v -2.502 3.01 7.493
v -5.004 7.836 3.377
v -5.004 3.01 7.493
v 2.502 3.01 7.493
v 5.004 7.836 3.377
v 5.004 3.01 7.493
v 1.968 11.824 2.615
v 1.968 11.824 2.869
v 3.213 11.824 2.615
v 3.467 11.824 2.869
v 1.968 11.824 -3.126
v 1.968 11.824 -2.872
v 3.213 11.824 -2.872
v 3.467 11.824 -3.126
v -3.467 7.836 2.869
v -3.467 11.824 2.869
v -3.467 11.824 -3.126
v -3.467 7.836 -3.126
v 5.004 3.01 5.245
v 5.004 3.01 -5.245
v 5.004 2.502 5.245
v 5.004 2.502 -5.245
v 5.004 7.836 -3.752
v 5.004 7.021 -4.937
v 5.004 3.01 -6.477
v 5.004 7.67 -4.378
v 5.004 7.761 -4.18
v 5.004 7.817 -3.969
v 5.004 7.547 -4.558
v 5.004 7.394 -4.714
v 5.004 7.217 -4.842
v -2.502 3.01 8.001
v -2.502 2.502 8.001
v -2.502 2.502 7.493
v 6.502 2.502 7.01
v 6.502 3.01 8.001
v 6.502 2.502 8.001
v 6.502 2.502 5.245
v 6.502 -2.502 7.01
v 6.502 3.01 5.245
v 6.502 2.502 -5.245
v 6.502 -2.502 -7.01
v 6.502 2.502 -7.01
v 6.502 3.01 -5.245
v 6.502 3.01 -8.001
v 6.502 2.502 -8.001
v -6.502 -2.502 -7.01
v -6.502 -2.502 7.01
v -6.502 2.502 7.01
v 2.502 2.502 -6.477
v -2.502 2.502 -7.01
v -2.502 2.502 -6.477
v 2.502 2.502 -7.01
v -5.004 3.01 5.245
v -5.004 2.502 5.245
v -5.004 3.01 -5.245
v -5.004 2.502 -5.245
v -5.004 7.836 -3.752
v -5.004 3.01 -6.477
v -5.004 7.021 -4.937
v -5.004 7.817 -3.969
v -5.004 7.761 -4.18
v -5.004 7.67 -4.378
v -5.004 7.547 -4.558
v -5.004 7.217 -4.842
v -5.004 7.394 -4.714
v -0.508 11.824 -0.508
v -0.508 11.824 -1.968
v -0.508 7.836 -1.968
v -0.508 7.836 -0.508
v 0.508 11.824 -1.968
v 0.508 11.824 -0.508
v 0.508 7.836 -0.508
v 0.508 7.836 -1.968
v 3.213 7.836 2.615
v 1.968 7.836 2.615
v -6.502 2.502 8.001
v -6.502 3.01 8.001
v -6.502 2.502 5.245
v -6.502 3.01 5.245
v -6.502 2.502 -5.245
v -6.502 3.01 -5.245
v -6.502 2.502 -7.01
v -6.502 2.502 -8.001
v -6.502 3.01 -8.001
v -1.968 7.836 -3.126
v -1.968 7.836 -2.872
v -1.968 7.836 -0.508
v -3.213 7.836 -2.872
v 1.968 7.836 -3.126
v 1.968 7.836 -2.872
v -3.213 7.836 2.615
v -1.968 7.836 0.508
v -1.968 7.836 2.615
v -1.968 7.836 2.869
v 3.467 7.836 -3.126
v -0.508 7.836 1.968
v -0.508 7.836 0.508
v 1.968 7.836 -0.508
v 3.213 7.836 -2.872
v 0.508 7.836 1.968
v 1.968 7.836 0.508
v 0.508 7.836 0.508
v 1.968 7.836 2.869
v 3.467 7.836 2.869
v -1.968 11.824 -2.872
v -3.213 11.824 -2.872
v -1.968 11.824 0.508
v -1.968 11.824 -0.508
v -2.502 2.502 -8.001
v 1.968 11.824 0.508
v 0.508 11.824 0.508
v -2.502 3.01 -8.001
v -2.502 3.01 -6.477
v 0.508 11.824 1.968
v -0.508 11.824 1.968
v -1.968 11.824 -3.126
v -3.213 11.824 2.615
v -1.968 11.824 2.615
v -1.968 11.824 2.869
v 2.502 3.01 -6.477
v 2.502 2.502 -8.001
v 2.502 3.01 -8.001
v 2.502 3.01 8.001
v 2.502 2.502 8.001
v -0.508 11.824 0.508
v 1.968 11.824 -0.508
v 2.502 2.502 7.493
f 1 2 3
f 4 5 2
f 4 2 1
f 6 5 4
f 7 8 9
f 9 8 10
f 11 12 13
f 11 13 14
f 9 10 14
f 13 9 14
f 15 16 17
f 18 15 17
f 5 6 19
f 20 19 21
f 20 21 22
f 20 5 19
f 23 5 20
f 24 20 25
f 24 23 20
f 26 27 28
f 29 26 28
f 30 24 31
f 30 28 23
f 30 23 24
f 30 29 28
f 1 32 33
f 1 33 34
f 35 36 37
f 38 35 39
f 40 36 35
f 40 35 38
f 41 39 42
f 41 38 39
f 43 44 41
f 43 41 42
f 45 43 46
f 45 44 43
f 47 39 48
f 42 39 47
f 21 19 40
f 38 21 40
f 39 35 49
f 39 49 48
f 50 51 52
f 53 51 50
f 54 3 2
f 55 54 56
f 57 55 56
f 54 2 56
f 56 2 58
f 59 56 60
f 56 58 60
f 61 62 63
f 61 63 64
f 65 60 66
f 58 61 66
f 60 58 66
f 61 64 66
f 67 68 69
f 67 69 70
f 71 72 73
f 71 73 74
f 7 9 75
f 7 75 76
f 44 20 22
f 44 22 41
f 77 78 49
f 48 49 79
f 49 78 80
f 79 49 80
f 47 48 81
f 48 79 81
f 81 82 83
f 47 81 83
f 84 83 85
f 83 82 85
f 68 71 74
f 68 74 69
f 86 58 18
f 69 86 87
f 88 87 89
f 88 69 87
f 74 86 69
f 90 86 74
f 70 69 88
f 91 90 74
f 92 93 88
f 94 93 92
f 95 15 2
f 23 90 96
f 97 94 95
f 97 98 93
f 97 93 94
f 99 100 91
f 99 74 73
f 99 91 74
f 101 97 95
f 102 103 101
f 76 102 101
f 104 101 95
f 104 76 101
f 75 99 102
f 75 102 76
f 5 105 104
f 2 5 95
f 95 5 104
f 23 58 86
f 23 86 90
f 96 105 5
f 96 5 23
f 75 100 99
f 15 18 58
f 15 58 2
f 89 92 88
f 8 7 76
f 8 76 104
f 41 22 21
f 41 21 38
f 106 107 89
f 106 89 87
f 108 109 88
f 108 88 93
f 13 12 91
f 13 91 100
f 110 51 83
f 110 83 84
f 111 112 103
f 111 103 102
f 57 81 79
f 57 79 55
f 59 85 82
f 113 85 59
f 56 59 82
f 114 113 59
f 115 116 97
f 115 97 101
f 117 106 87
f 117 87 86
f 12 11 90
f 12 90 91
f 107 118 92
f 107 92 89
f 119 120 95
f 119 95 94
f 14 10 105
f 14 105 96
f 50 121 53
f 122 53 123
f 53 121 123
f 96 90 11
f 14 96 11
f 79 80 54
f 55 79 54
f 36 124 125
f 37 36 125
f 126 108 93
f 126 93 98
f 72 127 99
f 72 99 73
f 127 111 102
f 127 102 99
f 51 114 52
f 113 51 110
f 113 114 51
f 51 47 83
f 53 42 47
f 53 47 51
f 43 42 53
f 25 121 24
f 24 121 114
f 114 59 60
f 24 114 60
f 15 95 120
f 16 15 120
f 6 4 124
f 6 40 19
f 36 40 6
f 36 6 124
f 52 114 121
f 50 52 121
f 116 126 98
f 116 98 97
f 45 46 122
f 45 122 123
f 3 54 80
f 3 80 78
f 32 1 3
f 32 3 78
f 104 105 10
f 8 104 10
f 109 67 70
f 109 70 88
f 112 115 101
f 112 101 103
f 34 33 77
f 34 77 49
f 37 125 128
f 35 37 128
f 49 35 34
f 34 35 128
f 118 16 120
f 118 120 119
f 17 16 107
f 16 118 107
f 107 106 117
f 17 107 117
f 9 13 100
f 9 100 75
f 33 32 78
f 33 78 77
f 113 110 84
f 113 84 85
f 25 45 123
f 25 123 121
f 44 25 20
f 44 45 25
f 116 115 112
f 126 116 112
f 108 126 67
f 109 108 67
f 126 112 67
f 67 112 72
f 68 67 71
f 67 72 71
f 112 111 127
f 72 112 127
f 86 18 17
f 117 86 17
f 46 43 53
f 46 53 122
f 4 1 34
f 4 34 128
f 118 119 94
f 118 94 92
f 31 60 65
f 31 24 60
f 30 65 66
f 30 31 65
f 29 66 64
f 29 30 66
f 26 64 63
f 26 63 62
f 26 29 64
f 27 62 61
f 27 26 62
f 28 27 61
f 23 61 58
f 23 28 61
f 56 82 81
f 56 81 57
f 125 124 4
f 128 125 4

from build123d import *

# Parameters (mm, degrees)
SALIENTE_EXTRUIR1_DEPTH      = 6.5024
SALIENTE_EXTRUIR1_DEPTH_BACK = 6.5024
SALIENTE_EXTRUIR2_DEPTH      = 5.0038
SALIENTE_EXTRUIR2_DEPTH_BACK = 5.0038
CROQUIS1_4_W                 = 5.9944
CROQUIS1_4_H                 = 3.9878
SALIENTE_EXTRUIR3_DEPTH      = 3.4671
SALIENTE_EXTRUIR3_DEPTH_BACK = 3.4671
CROQUIS2_W                   = 5.0038
CROQUIS2_H                   = 0.508
CROQUIS2_H_2                 = 1.524
CROQUIS2_W_2                 = 1.4986
CROQUIS2_H_3                 = 10.4902
CORTAR_EXTRUIR1_DEPTH        = 0.508
CROQUIS3_OUTSIDE_W           = 20.026
CROQUIS3_OUTSIDE_H           = 23.024
CORTAR_EXTRUIR2_DEPTH        = 3.9878


with BuildPart() as part:
    # Croquis1 → Saliente-Extruir1 (new body, two sides)
    with BuildSketch(Plane(origin=(0, 0, 0), x_dir=(0, 0, -1), z_dir=(1, 0, 0))) as saliente_extruir1_sk:
        Polygon((-3.5052, 3.0099), (-7.493, 3.0099), (-8.001, 3.0099), (-8.001, 2.5019), (-7.0104, 2.5019), (-7.0104, -2.5019), (7.0104, -2.5019), (7.0104, 2.5019), (8.001, 2.5019), (8.001, 3.0099), (6.477, 3.0099), align=None)
    extrude(amount=SALIENTE_EXTRUIR1_DEPTH)
    extrude(saliente_extruir1_sk.sketch, amount=-SALIENTE_EXTRUIR1_DEPTH_BACK)

    # Croquis1<3> → Saliente-Extruir2 (add, two sides)
    with BuildSketch(Plane(origin=(0, 0, 0), x_dir=(0, 0, -1), z_dir=(1, 0, 0))) as saliente_extruir2_sk:
        with BuildLine():
            Line((-2.868527833, 7.8359), (-3.376527833, 7.8359))
            Line((-3.376527833, 7.8359), (-7.493, 3.0099))
            Line((-7.493, 3.0099), (-3.5052, 3.0099))
            Line((-3.5052, 3.0099), (6.477, 3.0099))
            Line((6.477, 3.0099), (4.937272491, 7.021027296))
            ThreePointArc((4.937272491, 7.021027296), (4.47096127, 7.61254026), (3.751625349, 7.8359))
            Line((3.751625349, 7.8359), (3.125872167, 7.8359))
            Line((3.125872167, 7.8359), (-2.868527833, 7.8359))
        make_face()
    extrude(amount=SALIENTE_EXTRUIR2_DEPTH)
    extrude(saliente_extruir2_sk.sketch, amount=-SALIENTE_EXTRUIR2_DEPTH_BACK)

    # Croquis1<4> → Saliente-Extruir3 (add, two sides)
    with BuildSketch(Plane(origin=(0, 0, 0), x_dir=(0, 0, -1), z_dir=(1, 0, 0))) as saliente_extruir3_sk:
        with Locations((0.128672167, 9.8298)):
            Rectangle(CROQUIS1_4_W, CROQUIS1_4_H)
    extrude(amount=SALIENTE_EXTRUIR3_DEPTH)
    extrude(saliente_extruir3_sk.sketch, amount=-SALIENTE_EXTRUIR3_DEPTH_BACK)

    # Croquis2 → Cortar-Extruir1 (cut)
    with BuildSketch(Plane(origin=(0, 3.0099, 0), x_dir=(1, 0, 0), z_dir=(0, 1, 0))):
        with Locations((0, -7.747)):
            Rectangle(CROQUIS2_W, CROQUIS2_H)
        with Locations((0, 7.239)):
            Rectangle(CROQUIS2_W, CROQUIS2_H_2)
        with Locations((-5.7531, 0)):
            Rectangle(CROQUIS2_W_2, CROQUIS2_H_3)
        with Locations((5.7531, 0)):
            Rectangle(CROQUIS2_W_2, CROQUIS2_H_3)
    extrude(amount=-CORTAR_EXTRUIR1_DEPTH, mode=Mode.SUBTRACT)

    # Croquis3 outside → Cortar-Extruir2 (cut)
    with BuildSketch(Plane(origin=(0, 11.8237, 0), x_dir=(1, 0, 0), z_dir=(0, 1, 0))):
        Rectangle(CROQUIS3_OUTSIDE_W, CROQUIS3_OUTSIDE_H)
        Polygon((-3.4671, 3.125872167), (-3.4671, -2.868527833), (-1.9685, -2.868527833), (-1.9685, -2.614527833), (-3.2131, -2.614527833), (-3.2131, 2.871872167), (-1.9685, 2.871872167), (-1.9685, 3.125872167), align=None, mode=Mode.SUBTRACT)
        Polygon((0.508, 1.9685), (-0.508, 1.9685), (-0.508, 0.508), (-1.9685, 0.508), (-1.9685, -0.508), (-0.508, -0.508), (-0.508, -1.9685), (0.508, -1.9685), (0.508, -0.508), (1.9685, -0.508), (1.9685, 0.508), (0.508, 0.508), align=None, mode=Mode.SUBTRACT)
        Polygon((3.2131, 2.871872167), (3.2131, -2.614527833), (1.9685, -2.614527833), (1.9685, -2.868527833), (3.4671, -2.868527833), (3.4671, 3.125872167), (1.9685, 3.125872167), (1.9685, 2.871872167), align=None, mode=Mode.SUBTRACT)
    extrude(amount=-CORTAR_EXTRUIR2_DEPTH, mode=Mode.SUBTRACT)


solid = part.part
